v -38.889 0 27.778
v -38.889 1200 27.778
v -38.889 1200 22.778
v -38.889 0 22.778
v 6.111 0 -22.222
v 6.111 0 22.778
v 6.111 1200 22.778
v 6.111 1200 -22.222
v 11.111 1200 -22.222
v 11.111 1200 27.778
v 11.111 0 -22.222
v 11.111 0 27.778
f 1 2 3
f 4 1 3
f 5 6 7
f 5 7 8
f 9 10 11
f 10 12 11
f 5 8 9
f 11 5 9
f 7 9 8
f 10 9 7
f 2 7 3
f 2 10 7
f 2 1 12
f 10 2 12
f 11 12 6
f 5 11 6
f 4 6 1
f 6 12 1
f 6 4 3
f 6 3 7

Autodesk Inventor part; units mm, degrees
ref_plane "YZ Plane" through (0, 0, 0) normal (1, 0, 0) x (0, 1, 0)
ref_plane "XZ Plane" through (0, 0, 0) normal (0, 1, 0) x (-1, 0, 0)
ref_plane "XY Plane" through (0, 0, 0) normal (0, 0, 1) x (1, 0, 0)
sketch "Sketch1" plane through (0, 0, 0) normal (0, 1, 0) x (-1, 0, 0)
  line L0 (38.8889, 27.7778) -> (-11.1111, 27.7778)
  line L1 (-11.1111, 27.7778) -> (-11.1111, -22.2222)
  line L2 (38.8889, 27.7778) -> (38.8889, 22.7778)
  line L3 (38.8889, 22.7778) -> (-6.1111, 22.7778)
  line L4 (-6.1111, 22.7778) -> (-6.1111, -22.2222)
  line L5 (-6.1111, -22.2222) -> (-11.1111, -22.2222)
  point P0 (0, 0)
  dimension "d0" = 50
  dimension "d1" = 50
  dimension "d2" = 5
  dimension "d3" = 5
extrude "Extrusion1" add sketch "Sketch1" along normal blind 1200
properties part number "Ugol800"
